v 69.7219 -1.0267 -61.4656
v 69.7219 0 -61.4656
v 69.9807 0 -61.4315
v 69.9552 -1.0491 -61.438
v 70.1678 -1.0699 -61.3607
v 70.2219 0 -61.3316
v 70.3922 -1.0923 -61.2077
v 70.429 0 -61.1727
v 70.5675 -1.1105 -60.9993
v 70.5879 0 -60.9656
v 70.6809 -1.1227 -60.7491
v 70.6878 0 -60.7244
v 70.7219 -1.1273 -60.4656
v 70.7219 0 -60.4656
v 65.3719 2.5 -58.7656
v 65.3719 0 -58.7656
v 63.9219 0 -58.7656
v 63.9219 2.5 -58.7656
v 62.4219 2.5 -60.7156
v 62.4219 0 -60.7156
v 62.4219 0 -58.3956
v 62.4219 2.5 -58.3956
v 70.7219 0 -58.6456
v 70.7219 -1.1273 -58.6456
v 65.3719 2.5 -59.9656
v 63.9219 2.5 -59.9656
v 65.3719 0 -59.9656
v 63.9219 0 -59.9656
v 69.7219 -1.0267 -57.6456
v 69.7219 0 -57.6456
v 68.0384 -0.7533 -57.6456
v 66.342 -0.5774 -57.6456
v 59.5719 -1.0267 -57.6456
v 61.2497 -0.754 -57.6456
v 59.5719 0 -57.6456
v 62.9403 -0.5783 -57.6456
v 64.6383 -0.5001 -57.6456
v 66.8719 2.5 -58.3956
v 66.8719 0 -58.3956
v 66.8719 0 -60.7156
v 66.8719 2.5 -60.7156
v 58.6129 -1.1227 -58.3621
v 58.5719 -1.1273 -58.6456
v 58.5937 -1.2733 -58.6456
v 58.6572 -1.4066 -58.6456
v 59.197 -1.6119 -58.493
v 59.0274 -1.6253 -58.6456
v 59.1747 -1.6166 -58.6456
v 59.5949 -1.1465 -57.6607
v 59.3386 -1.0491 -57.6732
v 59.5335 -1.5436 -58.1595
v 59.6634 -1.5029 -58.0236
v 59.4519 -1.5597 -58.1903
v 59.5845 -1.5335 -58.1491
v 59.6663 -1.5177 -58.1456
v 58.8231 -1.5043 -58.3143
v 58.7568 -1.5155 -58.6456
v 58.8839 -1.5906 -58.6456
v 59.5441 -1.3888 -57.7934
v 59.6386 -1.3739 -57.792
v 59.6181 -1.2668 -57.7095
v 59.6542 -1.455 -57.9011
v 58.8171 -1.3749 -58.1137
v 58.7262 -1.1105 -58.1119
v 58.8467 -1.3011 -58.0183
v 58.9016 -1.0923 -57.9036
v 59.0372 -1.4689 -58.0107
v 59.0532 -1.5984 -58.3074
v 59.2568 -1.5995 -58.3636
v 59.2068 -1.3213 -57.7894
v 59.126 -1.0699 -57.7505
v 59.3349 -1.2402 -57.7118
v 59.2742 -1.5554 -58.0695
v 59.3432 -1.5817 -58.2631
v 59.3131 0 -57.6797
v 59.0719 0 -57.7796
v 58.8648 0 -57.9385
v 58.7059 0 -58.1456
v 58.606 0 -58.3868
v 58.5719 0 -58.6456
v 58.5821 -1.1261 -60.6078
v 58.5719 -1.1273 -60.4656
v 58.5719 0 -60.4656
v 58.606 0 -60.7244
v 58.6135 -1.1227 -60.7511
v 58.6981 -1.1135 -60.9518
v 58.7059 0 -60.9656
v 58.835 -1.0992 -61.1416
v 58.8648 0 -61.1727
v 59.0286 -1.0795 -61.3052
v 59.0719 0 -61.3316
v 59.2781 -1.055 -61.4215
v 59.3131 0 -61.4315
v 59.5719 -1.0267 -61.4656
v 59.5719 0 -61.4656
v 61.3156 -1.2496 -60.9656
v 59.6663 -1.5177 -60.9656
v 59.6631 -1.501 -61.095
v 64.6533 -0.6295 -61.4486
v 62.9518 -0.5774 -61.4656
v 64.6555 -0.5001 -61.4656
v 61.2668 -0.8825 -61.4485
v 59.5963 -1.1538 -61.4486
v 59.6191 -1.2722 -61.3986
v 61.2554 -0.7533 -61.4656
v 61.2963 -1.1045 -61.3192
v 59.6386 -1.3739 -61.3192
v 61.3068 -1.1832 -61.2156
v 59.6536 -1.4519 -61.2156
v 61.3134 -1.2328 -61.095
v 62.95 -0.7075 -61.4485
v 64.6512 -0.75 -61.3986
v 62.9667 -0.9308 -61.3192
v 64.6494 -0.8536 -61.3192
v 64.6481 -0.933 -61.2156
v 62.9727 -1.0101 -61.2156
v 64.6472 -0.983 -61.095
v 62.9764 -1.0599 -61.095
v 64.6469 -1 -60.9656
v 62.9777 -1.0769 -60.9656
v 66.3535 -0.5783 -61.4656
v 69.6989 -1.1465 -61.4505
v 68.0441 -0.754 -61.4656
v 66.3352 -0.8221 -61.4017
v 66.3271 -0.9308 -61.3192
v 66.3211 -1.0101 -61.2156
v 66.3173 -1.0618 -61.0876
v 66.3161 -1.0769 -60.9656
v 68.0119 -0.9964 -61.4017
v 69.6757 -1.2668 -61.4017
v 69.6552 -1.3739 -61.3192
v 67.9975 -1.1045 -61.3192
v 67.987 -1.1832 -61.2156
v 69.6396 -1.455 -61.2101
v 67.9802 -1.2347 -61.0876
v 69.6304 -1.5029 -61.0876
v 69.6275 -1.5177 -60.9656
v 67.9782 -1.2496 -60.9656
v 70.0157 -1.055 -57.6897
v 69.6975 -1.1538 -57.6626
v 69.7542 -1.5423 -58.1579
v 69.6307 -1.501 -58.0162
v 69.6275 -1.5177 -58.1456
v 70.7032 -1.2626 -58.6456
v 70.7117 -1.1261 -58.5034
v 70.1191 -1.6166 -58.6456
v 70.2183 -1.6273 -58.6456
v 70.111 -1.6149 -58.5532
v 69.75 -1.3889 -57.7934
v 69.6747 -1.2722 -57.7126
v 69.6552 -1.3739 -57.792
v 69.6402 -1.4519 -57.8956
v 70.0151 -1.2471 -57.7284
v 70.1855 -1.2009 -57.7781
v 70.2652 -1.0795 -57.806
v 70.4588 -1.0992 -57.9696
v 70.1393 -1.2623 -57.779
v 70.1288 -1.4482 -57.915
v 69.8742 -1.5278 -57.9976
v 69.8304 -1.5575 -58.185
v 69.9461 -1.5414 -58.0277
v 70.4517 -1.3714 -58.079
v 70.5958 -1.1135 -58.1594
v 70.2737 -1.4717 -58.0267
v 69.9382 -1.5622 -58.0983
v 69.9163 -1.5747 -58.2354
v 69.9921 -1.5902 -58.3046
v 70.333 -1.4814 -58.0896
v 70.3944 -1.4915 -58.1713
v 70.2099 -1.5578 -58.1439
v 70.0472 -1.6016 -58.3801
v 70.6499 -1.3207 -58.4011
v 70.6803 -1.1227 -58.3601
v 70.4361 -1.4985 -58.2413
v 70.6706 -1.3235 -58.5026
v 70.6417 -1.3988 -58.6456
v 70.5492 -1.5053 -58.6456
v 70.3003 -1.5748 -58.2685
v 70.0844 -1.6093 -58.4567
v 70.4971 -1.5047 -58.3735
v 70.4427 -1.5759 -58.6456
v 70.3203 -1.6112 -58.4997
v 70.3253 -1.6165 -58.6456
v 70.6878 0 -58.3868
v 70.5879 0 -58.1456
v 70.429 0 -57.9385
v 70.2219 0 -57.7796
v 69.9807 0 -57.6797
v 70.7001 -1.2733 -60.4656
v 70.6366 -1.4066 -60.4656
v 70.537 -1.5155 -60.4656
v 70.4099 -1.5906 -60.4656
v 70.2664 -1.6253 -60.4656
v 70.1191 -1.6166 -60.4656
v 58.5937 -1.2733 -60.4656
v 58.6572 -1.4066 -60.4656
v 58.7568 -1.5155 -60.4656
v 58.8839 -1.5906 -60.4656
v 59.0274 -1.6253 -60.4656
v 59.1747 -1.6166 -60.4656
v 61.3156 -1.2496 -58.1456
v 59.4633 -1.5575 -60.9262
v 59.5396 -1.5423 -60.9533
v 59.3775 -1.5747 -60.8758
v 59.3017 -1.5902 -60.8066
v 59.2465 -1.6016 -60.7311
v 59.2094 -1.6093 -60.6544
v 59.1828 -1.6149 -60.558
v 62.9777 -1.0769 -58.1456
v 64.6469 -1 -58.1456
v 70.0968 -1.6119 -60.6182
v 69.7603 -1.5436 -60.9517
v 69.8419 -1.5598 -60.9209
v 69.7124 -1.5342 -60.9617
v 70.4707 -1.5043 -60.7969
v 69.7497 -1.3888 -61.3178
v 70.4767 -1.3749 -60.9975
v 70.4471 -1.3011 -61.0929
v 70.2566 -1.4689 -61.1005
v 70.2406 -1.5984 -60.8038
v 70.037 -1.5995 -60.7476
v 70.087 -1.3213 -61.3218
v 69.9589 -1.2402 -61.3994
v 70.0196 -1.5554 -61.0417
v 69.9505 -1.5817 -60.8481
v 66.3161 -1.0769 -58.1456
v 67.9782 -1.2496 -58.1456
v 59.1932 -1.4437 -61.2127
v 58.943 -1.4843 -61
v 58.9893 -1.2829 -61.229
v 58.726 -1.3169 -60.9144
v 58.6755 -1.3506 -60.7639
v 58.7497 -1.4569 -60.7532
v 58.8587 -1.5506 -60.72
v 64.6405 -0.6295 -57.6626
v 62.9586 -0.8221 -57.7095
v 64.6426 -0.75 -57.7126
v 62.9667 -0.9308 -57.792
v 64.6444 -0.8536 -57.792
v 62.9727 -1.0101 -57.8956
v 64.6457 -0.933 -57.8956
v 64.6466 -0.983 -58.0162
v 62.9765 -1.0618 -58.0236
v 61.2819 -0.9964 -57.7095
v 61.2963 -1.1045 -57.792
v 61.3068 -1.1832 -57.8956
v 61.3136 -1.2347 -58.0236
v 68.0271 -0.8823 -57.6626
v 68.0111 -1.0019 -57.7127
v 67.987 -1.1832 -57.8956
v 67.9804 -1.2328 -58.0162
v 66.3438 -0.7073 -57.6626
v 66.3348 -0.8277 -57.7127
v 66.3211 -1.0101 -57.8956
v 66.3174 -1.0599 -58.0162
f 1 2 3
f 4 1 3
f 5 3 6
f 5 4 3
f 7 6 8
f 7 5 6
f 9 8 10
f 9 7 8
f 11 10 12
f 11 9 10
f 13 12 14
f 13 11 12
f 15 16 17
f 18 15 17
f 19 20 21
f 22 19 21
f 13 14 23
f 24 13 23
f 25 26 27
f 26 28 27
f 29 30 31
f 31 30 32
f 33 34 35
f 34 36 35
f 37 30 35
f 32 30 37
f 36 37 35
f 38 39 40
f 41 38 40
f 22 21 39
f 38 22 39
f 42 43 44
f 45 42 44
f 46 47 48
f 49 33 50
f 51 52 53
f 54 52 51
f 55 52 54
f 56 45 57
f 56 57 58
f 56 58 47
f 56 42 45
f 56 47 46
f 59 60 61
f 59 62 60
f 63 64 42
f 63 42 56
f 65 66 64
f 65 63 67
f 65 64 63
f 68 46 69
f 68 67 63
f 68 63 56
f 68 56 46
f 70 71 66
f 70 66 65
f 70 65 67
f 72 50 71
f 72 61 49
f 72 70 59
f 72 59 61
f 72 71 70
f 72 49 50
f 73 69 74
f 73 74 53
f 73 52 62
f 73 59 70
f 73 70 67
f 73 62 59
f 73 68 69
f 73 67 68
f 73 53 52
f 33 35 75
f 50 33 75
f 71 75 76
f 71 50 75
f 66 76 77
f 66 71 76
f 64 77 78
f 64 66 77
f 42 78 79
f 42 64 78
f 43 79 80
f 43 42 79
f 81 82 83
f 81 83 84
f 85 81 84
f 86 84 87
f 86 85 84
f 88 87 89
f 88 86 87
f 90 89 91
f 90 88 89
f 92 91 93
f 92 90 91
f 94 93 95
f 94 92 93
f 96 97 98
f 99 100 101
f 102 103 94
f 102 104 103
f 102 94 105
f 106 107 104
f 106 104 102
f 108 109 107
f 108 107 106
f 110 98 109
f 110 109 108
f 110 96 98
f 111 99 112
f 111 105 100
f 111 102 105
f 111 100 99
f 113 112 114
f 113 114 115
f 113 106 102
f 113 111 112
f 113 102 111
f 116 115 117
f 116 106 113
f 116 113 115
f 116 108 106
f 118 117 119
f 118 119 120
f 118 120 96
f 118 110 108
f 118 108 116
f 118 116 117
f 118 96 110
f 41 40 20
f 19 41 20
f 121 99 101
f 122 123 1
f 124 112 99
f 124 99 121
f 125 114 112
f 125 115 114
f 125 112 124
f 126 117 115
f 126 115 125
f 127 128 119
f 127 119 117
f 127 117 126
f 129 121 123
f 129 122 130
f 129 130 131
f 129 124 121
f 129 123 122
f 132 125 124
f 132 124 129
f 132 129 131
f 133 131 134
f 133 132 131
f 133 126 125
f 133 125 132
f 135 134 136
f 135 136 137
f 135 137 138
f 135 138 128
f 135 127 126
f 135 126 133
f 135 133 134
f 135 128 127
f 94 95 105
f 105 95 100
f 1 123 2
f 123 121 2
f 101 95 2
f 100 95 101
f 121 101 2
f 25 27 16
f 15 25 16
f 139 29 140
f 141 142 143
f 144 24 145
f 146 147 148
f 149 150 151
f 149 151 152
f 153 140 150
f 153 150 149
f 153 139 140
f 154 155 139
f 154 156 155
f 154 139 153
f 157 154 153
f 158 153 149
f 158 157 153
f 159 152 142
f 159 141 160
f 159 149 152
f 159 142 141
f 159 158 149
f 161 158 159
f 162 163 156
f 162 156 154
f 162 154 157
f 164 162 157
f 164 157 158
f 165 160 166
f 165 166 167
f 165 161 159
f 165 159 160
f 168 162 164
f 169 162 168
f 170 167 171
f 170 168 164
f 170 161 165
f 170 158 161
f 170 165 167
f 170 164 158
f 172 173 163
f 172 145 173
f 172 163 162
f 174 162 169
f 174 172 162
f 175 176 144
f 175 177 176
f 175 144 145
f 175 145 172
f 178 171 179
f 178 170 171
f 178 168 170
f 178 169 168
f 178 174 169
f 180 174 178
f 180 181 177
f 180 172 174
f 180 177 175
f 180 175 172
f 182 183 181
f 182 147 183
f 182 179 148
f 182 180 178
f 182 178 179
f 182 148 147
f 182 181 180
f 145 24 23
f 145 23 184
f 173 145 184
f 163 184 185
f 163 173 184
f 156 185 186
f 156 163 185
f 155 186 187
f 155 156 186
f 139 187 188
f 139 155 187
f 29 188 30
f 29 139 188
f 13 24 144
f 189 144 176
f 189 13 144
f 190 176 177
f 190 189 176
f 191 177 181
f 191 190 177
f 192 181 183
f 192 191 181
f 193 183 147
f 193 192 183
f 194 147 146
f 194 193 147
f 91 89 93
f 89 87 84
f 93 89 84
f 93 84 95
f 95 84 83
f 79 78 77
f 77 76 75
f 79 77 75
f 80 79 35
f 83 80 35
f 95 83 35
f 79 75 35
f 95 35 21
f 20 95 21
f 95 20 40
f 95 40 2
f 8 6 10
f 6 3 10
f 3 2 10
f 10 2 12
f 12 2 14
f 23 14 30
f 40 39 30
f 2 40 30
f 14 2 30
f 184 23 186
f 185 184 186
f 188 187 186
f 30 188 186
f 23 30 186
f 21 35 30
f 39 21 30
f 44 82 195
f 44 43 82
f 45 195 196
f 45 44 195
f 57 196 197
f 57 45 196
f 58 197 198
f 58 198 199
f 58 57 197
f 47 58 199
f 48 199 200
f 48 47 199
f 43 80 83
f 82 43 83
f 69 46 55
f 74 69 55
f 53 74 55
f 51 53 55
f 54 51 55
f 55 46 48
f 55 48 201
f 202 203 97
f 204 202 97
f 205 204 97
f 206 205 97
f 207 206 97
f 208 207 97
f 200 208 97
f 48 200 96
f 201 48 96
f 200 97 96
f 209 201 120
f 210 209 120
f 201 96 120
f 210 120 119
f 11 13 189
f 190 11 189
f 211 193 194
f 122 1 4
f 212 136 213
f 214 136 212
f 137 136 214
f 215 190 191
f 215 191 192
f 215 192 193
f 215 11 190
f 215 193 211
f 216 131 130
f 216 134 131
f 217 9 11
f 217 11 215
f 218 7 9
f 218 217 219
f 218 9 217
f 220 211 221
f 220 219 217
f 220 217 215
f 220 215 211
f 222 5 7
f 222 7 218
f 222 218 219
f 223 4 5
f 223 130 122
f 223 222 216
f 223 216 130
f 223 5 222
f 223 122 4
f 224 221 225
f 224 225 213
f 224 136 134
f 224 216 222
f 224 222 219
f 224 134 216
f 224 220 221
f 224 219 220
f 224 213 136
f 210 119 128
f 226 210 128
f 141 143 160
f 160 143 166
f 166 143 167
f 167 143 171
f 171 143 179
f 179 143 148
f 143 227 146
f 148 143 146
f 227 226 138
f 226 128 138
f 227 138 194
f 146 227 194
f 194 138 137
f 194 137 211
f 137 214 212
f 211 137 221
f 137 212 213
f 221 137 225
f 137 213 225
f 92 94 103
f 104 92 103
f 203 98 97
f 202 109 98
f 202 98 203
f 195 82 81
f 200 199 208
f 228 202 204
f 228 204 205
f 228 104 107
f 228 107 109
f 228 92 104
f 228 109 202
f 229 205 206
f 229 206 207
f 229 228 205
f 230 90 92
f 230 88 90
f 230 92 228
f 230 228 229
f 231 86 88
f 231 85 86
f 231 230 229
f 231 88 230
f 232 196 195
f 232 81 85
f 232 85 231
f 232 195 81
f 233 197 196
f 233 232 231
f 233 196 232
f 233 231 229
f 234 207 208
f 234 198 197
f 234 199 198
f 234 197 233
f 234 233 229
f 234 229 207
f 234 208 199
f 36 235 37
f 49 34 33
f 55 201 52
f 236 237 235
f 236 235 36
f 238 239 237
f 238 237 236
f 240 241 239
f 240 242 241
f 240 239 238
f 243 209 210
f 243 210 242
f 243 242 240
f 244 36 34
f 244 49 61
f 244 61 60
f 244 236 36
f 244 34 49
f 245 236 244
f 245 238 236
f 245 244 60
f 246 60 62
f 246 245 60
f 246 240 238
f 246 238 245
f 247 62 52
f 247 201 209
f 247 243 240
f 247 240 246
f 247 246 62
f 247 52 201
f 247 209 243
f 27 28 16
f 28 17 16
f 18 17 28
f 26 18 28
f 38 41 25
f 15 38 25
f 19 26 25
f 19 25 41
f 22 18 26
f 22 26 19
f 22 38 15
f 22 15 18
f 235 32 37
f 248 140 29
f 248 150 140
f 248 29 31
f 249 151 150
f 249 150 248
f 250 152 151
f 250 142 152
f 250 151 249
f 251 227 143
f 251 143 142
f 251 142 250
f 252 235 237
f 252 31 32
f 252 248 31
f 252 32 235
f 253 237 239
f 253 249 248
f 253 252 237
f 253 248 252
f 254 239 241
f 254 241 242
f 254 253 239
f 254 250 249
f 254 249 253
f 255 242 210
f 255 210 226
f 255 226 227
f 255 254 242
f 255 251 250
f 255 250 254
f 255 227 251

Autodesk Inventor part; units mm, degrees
ref_plane "YZ Plane" through (0, 0, 0) normal (1, 0, 0) x (0, 1, 0)
sketch "Sketch3" plane through (0, 0, 0) normal (0, 1, 0) x (-1, 0, 0)
  line L0 (-64.0219, -58.8656) -> (-65.2719, -58.8656) projected
  line L1 (-65.2719, -58.8656) -> (-65.2719, -59.8656) projected
  line L2 (-65.2719, -59.8656) -> (-64.0219, -59.8656) projected
  line L3 (-64.0219, -59.8656) -> (-64.0219, -58.8656) projected
  line L4 (-63.9219, -59.9656) -> (-65.3719, -59.9656)
  line L5 (-65.3719, -59.9656) -> (-65.3719, -58.7656)
  line L6 (-65.3719, -58.7656) -> (-63.9219, -58.7656)
  line L7 (-63.9219, -58.7656) -> (-63.9219, -59.9656)
  line L8 (-66.8719, -60.7156) -> (-62.4219, -60.7156)
  line L9 (-62.4219, -60.7156) -> (-62.4219, -58.3956)
  line L10 (-62.4219, -58.3956) -> (-66.8719, -58.3956)
  line L11 (-66.8719, -58.3956) -> (-66.8719, -60.7156)
  line L12 (-70.1719, -61.0956) -> (-70.1719, -58.0956) projected
  line L13 (-70.1719, -58.0956) -> (-60.6119, -58.0956) projected
  line L14 (-60.6119, -61.0956) -> (-60.6119, -58.0956) projected
  dimension "d4" = 0.1
  dimension "d8" = 1.5
  dimension "d9" = 1.5
  dimension "d10" = 0.3
  dimension "d11" = 0.75
extrude "Extrusion3" add sketch "Sketch3" along normal blind 2.5 contours L11 L10 L9 L8
ref_plane "Work Plane1" through (65.3719, 0, -59.3656) normal (0, 0, -1) x (-1, 0, 0)
ref_plane "Work Plane2" through (64.6469, 0, -58.7656) normal (1, 0, 0) x (0, 0, -1)
sketch "Sketch4" plane through (0, 0, 0) normal (0, -1, 0) x (1, 0, 0)
  line L0 (60.1219, -61.0956) -> (60.1219, -58.0956) projected
  line L1 (67.6819, -58.0956) -> (67.6819, -61.0956) projected
  line L2 (60.1219, -58.0956) -> (67.6819, -58.0956) projected
  line L3 (62.4219, -58.3956) -> (66.8719, -58.3956) projected
  line L4 (66.8719, -58.3956) -> (66.8719, -60.7156) projected
  line L5 (66.8719, -60.7156) -> (62.4219, -60.7156) projected
  line L6 (62.4219, -60.7156) -> (62.4219, -58.3956) projected
  line L7 (70.7219, -57.6456) -> (58.5719, -57.6456)
  line L8 (58.5719, -57.6456) -> (58.5719, -61.4656)
  line L9 (58.5719, -61.4656) -> (70.7219, -61.4656)
  line L10 (70.7219, -61.4656) -> (70.7219, -57.6456)
  dimension "d13" = 3.85
  dimension "d14" = 3.85
extrude "Extrusion4" add sketch "Sketch4" along normal blind 1 contours L3 L4 L5 L6 | L10 L9 L8 L7
fillet "Fillet1" radius 1 4 edges at (70.7219, -0.5, -61.4656) (58.5719, -0.5, -61.4656) (58.5719, -0.5, -57.6456) (70.7219, -0.5, -57.6456)
sketch "Sketch6" plane through (69.7219, 0, -61.4656) normal (0, 0, -1) x (-1, 0, 0)
  line L0 (10.15, -1) -> (0, -1) projected
  line L1 (11.15, -1) -> (10.15, -1) projected
  line L2 (0, -1) -> (-1, -1) projected
  line L3 (11.15, -1) -> (11.15, -1.75)
  line L4 (0, -1) -> (10.15, -1) projected
  line L5 (5.075, -1) -> (5.075, -2.2009)
  arc A0 (11.15, -1.75) -> (5.075, -1) centre (4.574, -30.0368) ccw
  line L6 (-1, -1) -> (-1, -1.75)
  arc A1 (5.075, -1) -> (-1, -1.75) centre (5.576, -30.0368) ccw
  dimension "d18" = 0.75
extrude "Extrusion5" add sketch "Sketch6" against normal up to surface (3.82 mm away)
sketch "Sketch7" plane through (69.7219, -1, -61.4656) normal (0, 1, 0) x (1, 0, 0)
  arc A0 (0, -3.82) -> (1, -2.82) centre (0, -2.82) ccw projected
  line L0 (0, -3.82) -> (1, -3.82) projected
  line L1 (1, -2.82) -> (1, -3.82) projected
  arc A1 (1, -1) -> (0, 0) centre (0, -1) ccw projected
  line L2 (1, 0) -> (1, -1) projected
  line L3 (0, 0) -> (1, 0) projected
  arc A2 (-10.15, 0) -> (-11.15, -1) centre (-10.15, -1) ccw projected
  line L4 (-11.15, 0) -> (-10.15, 0) projected
  line L5 (-11.15, 0) -> (-11.15, -1) projected
  arc A3 (-11.15, -2.82) -> (-10.15, -3.82) centre (-10.15, -2.82) ccw projected
  line L6 (-11.15, -2.82) -> (-11.15, -3.82) projected
  line L7 (-11.15, -3.82) -> (-10.15, -3.82) projected
extrude "Extrusion6" cut sketch "Sketch7" against normal blind 1
fillet "Fillet2" radius 0.5 6 edges at (58.5719, -1.75, -59.5556) (62.0976, -1.1563, -57.6456) (62.0976, -1.1563, -61.4656) (70.7219, -1.75, -59.5556) (67.1962, -1.1563, -57.6456) (67.1962, -1.1563, -61.4656)
properties part number "Power Switch Cap"
